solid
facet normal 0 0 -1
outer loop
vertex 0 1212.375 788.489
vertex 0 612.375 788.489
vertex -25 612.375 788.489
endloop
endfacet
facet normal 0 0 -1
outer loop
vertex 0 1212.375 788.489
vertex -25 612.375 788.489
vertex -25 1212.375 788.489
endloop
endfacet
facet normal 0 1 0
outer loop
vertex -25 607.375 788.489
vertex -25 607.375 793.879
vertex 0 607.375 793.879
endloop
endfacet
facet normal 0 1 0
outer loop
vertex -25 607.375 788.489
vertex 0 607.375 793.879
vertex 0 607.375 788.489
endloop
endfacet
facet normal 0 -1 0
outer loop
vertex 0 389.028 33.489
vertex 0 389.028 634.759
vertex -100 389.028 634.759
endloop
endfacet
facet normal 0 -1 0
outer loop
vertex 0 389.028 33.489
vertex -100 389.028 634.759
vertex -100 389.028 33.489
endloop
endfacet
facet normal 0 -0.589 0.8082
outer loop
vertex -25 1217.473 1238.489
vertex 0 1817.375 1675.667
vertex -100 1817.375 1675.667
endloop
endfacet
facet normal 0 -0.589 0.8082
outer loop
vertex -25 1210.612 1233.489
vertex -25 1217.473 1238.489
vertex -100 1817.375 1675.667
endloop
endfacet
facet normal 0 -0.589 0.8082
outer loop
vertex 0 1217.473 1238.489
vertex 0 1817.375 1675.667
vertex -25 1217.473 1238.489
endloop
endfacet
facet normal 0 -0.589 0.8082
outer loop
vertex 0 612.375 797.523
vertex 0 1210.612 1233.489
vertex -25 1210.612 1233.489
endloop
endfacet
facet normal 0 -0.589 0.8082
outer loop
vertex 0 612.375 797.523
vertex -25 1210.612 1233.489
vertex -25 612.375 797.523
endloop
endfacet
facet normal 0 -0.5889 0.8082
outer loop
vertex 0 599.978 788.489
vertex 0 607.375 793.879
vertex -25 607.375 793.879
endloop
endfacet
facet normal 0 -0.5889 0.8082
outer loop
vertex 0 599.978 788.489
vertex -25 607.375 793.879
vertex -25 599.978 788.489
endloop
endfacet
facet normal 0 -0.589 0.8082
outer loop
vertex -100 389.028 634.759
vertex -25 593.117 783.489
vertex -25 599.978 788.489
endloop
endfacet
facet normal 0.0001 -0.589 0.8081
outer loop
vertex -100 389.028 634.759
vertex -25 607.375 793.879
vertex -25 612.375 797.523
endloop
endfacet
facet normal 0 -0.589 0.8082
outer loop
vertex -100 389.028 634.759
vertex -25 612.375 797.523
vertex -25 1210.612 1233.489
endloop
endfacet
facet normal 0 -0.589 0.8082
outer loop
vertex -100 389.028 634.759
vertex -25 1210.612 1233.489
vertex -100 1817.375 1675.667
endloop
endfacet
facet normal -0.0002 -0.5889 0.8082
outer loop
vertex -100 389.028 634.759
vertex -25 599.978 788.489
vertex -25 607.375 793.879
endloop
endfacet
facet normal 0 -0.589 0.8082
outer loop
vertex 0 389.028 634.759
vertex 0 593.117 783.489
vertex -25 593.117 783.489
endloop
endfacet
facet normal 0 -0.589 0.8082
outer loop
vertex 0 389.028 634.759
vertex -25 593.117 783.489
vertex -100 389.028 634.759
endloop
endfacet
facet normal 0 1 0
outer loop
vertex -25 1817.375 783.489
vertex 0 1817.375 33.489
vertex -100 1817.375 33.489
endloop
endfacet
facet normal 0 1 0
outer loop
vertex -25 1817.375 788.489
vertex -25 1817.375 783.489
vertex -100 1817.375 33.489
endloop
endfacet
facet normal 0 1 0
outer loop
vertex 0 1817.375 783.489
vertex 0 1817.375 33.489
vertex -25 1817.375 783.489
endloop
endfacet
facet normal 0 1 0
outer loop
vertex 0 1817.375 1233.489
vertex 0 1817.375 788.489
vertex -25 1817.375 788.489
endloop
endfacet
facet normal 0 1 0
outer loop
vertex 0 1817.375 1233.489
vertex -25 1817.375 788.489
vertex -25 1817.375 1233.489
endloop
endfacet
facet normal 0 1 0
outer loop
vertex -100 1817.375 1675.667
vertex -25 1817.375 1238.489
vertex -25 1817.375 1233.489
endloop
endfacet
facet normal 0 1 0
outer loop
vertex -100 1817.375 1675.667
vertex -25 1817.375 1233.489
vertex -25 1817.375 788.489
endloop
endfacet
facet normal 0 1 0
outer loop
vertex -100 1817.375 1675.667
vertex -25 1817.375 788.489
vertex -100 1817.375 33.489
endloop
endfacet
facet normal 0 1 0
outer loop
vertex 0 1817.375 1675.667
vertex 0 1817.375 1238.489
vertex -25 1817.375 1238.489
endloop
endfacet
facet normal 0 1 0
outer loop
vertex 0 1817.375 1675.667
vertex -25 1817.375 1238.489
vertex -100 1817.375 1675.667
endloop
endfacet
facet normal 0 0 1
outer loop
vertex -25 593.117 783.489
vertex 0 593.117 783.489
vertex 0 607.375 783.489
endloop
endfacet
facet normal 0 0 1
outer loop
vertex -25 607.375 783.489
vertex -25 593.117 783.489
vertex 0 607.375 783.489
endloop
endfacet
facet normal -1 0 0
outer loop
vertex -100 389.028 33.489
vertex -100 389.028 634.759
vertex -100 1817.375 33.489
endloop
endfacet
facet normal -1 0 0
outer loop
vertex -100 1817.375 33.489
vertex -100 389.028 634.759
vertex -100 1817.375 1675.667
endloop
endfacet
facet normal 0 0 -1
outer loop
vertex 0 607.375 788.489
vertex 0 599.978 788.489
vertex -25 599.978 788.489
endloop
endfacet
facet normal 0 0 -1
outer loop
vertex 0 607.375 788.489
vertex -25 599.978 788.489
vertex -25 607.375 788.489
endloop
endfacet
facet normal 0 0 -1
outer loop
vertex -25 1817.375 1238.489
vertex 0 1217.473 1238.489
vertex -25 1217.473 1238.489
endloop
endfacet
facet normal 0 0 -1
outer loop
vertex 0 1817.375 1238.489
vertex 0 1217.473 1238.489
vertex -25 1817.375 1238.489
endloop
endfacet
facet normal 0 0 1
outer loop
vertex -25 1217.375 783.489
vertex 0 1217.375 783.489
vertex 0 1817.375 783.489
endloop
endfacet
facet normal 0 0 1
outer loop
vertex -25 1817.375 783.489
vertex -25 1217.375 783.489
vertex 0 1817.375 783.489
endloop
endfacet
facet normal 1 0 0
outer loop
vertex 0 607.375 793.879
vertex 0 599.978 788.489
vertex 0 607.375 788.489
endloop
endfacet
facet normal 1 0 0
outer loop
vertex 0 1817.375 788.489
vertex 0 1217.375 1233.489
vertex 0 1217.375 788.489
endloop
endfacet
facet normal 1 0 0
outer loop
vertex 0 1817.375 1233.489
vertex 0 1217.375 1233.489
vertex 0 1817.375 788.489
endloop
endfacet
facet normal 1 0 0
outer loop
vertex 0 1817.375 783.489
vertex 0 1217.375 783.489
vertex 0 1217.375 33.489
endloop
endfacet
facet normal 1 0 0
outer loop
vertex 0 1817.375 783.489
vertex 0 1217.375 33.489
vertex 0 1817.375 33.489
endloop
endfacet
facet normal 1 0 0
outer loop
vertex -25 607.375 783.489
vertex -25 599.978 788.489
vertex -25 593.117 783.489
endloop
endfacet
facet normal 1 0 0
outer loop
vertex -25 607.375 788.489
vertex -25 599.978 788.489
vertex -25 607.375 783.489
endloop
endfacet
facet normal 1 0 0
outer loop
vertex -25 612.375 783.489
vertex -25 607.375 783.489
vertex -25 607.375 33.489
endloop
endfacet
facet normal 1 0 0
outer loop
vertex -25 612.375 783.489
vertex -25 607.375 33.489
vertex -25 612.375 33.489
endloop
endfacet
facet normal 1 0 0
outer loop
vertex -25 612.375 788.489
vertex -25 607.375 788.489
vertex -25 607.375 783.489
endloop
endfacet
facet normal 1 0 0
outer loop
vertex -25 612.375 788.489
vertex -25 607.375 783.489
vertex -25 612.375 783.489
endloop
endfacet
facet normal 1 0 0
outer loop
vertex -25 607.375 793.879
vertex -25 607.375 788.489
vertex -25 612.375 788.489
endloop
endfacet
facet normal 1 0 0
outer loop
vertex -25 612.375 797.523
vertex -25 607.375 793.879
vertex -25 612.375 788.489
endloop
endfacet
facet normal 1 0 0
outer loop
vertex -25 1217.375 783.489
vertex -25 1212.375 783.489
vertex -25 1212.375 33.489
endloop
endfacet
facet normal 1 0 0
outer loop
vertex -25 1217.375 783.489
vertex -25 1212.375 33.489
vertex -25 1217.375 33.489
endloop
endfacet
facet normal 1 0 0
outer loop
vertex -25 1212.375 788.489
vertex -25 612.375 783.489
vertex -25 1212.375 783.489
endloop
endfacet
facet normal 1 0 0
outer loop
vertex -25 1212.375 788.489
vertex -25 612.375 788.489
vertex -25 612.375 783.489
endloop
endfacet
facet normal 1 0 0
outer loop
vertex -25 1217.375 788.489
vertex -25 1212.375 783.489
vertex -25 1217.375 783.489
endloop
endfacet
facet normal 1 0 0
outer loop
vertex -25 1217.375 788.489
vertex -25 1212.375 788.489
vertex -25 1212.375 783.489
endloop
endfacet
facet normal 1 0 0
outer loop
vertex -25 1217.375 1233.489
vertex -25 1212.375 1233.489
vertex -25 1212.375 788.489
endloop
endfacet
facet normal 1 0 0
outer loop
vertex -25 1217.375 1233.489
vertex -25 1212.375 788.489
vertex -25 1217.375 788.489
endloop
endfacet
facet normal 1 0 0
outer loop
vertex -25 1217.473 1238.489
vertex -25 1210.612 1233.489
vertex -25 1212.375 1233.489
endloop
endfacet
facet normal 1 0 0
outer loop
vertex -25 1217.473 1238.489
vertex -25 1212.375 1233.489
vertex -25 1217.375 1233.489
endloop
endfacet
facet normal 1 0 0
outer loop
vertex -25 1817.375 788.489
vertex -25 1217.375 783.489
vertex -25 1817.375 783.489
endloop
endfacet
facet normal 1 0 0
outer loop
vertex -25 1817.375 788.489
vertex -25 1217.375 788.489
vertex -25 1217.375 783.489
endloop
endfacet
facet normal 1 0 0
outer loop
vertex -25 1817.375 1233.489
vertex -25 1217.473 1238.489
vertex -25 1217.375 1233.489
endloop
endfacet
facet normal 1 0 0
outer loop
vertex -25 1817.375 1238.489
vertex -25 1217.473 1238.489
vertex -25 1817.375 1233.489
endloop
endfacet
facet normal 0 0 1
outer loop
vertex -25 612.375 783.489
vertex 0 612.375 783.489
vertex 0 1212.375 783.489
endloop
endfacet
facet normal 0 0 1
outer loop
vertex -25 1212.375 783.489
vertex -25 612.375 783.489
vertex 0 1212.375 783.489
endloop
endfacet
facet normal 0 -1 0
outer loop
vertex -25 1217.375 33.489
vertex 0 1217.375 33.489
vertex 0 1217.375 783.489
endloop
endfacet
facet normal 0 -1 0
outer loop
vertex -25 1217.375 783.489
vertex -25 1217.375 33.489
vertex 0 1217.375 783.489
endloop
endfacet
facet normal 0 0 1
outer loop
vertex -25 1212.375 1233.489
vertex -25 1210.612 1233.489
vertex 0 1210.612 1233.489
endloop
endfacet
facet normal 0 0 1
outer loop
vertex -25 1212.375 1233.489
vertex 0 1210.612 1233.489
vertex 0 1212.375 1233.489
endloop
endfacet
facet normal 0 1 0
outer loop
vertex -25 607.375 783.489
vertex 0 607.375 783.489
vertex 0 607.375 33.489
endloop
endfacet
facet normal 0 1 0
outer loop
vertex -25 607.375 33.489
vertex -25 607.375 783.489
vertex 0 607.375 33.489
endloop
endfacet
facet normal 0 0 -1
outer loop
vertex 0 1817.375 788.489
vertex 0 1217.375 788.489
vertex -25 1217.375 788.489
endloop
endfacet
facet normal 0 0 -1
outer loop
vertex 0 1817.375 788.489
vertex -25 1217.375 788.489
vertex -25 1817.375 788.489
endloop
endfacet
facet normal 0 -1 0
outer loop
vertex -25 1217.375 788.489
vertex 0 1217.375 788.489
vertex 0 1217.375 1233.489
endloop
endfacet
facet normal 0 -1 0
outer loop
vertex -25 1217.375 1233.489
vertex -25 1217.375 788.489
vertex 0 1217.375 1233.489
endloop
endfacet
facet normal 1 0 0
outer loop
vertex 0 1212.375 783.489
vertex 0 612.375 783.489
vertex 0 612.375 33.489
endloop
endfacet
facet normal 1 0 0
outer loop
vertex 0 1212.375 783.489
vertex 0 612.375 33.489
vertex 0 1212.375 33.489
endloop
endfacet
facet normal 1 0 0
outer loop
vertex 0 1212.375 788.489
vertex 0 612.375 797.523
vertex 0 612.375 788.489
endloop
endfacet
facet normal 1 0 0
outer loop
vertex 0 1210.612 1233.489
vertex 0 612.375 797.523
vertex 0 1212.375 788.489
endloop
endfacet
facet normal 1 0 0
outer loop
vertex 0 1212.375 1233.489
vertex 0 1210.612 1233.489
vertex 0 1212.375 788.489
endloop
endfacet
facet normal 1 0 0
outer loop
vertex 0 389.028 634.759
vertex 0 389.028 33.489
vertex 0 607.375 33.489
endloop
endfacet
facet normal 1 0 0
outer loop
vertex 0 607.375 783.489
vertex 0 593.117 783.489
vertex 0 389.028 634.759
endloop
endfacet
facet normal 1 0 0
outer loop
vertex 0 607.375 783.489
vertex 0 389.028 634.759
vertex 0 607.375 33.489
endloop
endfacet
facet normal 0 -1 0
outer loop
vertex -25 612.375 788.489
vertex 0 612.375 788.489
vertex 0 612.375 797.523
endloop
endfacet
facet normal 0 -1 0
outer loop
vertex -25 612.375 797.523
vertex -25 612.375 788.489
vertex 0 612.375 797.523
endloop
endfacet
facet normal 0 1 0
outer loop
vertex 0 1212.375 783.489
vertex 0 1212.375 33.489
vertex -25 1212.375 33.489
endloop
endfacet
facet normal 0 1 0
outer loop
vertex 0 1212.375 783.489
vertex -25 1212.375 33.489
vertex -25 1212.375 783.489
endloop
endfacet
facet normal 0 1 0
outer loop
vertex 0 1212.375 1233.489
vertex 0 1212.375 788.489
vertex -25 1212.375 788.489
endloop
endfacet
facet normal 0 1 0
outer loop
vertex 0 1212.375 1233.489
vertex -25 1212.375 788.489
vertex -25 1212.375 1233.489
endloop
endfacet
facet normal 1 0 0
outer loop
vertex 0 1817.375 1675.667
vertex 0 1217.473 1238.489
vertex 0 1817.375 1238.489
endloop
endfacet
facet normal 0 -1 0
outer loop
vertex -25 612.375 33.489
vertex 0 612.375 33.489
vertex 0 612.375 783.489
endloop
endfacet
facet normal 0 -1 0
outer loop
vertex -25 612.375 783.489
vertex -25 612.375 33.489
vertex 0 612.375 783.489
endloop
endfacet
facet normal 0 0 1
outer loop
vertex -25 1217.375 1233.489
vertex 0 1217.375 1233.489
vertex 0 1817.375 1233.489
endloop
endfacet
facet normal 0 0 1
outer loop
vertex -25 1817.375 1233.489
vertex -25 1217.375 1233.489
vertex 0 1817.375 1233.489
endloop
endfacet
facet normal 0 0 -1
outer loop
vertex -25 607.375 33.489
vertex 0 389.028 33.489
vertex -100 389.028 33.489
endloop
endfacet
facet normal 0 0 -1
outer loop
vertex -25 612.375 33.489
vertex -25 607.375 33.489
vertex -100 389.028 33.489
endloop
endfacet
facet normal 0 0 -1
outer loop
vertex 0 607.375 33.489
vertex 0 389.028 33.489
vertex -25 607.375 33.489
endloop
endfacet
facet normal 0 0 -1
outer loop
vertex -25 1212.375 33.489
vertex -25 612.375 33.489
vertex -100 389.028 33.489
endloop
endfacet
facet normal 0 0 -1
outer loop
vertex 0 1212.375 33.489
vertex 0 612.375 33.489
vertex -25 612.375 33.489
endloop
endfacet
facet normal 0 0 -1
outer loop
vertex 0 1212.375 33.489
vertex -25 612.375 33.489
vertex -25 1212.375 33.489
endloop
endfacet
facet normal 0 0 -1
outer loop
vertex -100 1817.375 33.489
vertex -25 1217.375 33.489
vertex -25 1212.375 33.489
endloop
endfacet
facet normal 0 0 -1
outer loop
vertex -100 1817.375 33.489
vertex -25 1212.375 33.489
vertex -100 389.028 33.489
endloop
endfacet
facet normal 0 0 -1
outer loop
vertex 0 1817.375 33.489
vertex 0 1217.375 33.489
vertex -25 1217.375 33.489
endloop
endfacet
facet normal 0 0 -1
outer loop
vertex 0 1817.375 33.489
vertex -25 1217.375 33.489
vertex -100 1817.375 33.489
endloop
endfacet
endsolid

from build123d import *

# Parameters (mm, degrees)
F1_DEPTH = 100
F2_W     = 5
F2_H     = 581
F2_W_2   = 1636.7888212204
F2_H_2   = 5
F2_W_3   = 600
F2_H_3   = 1200
F2_W_4   = 607.3750638962
F3_DEPTH = 25
F4_W     = 2650
F4_H     = 5
F5_DEPTH = 25


with BuildPart() as f1:
    # F0 (on Right) → F1 (new body)
    with BuildSketch(Plane.YZ):
        Polygon((389.0280389786, 634.7590853661), (389.0280389786, 33.4885828197), (1817.3750638962, 33.4885828197), (1817.3750638962, 1675.6669797748), align=None)
    extrude(amount=-F1_DEPTH)

    # F2 (on Right) → F3 (cut)
    with BuildSketch(Plane.YZ):
        with Locations((1214.8750638962, 1528.9885828197)):
            Rectangle(F2_W, F2_H)
        with Locations((2035.7694745064, 1235.9885828197)):
            Rectangle(F2_W_2, F2_H_2)
        with Locations((1214.8750638962, 1235.9885828197)):
            Rectangle(F2_W, F2_H_2)
        with Locations((912.3750638962, 1235.9885828197)):
            Rectangle(F2_W_3, F2_H_2)
        with Locations((1214.8750638962, 633.4885828197)):
            Rectangle(F2_W, F2_H_3)
        with Locations((609.8750638962, 1528.9885828197)):
            Rectangle(F2_W, F2_H)
        with Locations((609.8750638962, 1235.9885828197)):
            Rectangle(F2_W, F2_H_2)
        with Locations((609.8750638962, 633.4885828197)):
            Rectangle(F2_W, F2_H_3)
        with Locations((303.6875319481, 1235.9885828197)):
            Rectangle(F2_W_4, F2_H_2)
    extrude(amount=-F3_DEPTH, mode=Mode.SUBTRACT)

    # F4 (on face) → F5 (cut)
    with BuildSketch(Plane.YZ):
        with Locations((1624.0280389786, 785.9885828197)):
            Rectangle(F4_W, F4_H)
    extrude(amount=-F5_DEPTH, mode=Mode.SUBTRACT)


solid = f1.part
